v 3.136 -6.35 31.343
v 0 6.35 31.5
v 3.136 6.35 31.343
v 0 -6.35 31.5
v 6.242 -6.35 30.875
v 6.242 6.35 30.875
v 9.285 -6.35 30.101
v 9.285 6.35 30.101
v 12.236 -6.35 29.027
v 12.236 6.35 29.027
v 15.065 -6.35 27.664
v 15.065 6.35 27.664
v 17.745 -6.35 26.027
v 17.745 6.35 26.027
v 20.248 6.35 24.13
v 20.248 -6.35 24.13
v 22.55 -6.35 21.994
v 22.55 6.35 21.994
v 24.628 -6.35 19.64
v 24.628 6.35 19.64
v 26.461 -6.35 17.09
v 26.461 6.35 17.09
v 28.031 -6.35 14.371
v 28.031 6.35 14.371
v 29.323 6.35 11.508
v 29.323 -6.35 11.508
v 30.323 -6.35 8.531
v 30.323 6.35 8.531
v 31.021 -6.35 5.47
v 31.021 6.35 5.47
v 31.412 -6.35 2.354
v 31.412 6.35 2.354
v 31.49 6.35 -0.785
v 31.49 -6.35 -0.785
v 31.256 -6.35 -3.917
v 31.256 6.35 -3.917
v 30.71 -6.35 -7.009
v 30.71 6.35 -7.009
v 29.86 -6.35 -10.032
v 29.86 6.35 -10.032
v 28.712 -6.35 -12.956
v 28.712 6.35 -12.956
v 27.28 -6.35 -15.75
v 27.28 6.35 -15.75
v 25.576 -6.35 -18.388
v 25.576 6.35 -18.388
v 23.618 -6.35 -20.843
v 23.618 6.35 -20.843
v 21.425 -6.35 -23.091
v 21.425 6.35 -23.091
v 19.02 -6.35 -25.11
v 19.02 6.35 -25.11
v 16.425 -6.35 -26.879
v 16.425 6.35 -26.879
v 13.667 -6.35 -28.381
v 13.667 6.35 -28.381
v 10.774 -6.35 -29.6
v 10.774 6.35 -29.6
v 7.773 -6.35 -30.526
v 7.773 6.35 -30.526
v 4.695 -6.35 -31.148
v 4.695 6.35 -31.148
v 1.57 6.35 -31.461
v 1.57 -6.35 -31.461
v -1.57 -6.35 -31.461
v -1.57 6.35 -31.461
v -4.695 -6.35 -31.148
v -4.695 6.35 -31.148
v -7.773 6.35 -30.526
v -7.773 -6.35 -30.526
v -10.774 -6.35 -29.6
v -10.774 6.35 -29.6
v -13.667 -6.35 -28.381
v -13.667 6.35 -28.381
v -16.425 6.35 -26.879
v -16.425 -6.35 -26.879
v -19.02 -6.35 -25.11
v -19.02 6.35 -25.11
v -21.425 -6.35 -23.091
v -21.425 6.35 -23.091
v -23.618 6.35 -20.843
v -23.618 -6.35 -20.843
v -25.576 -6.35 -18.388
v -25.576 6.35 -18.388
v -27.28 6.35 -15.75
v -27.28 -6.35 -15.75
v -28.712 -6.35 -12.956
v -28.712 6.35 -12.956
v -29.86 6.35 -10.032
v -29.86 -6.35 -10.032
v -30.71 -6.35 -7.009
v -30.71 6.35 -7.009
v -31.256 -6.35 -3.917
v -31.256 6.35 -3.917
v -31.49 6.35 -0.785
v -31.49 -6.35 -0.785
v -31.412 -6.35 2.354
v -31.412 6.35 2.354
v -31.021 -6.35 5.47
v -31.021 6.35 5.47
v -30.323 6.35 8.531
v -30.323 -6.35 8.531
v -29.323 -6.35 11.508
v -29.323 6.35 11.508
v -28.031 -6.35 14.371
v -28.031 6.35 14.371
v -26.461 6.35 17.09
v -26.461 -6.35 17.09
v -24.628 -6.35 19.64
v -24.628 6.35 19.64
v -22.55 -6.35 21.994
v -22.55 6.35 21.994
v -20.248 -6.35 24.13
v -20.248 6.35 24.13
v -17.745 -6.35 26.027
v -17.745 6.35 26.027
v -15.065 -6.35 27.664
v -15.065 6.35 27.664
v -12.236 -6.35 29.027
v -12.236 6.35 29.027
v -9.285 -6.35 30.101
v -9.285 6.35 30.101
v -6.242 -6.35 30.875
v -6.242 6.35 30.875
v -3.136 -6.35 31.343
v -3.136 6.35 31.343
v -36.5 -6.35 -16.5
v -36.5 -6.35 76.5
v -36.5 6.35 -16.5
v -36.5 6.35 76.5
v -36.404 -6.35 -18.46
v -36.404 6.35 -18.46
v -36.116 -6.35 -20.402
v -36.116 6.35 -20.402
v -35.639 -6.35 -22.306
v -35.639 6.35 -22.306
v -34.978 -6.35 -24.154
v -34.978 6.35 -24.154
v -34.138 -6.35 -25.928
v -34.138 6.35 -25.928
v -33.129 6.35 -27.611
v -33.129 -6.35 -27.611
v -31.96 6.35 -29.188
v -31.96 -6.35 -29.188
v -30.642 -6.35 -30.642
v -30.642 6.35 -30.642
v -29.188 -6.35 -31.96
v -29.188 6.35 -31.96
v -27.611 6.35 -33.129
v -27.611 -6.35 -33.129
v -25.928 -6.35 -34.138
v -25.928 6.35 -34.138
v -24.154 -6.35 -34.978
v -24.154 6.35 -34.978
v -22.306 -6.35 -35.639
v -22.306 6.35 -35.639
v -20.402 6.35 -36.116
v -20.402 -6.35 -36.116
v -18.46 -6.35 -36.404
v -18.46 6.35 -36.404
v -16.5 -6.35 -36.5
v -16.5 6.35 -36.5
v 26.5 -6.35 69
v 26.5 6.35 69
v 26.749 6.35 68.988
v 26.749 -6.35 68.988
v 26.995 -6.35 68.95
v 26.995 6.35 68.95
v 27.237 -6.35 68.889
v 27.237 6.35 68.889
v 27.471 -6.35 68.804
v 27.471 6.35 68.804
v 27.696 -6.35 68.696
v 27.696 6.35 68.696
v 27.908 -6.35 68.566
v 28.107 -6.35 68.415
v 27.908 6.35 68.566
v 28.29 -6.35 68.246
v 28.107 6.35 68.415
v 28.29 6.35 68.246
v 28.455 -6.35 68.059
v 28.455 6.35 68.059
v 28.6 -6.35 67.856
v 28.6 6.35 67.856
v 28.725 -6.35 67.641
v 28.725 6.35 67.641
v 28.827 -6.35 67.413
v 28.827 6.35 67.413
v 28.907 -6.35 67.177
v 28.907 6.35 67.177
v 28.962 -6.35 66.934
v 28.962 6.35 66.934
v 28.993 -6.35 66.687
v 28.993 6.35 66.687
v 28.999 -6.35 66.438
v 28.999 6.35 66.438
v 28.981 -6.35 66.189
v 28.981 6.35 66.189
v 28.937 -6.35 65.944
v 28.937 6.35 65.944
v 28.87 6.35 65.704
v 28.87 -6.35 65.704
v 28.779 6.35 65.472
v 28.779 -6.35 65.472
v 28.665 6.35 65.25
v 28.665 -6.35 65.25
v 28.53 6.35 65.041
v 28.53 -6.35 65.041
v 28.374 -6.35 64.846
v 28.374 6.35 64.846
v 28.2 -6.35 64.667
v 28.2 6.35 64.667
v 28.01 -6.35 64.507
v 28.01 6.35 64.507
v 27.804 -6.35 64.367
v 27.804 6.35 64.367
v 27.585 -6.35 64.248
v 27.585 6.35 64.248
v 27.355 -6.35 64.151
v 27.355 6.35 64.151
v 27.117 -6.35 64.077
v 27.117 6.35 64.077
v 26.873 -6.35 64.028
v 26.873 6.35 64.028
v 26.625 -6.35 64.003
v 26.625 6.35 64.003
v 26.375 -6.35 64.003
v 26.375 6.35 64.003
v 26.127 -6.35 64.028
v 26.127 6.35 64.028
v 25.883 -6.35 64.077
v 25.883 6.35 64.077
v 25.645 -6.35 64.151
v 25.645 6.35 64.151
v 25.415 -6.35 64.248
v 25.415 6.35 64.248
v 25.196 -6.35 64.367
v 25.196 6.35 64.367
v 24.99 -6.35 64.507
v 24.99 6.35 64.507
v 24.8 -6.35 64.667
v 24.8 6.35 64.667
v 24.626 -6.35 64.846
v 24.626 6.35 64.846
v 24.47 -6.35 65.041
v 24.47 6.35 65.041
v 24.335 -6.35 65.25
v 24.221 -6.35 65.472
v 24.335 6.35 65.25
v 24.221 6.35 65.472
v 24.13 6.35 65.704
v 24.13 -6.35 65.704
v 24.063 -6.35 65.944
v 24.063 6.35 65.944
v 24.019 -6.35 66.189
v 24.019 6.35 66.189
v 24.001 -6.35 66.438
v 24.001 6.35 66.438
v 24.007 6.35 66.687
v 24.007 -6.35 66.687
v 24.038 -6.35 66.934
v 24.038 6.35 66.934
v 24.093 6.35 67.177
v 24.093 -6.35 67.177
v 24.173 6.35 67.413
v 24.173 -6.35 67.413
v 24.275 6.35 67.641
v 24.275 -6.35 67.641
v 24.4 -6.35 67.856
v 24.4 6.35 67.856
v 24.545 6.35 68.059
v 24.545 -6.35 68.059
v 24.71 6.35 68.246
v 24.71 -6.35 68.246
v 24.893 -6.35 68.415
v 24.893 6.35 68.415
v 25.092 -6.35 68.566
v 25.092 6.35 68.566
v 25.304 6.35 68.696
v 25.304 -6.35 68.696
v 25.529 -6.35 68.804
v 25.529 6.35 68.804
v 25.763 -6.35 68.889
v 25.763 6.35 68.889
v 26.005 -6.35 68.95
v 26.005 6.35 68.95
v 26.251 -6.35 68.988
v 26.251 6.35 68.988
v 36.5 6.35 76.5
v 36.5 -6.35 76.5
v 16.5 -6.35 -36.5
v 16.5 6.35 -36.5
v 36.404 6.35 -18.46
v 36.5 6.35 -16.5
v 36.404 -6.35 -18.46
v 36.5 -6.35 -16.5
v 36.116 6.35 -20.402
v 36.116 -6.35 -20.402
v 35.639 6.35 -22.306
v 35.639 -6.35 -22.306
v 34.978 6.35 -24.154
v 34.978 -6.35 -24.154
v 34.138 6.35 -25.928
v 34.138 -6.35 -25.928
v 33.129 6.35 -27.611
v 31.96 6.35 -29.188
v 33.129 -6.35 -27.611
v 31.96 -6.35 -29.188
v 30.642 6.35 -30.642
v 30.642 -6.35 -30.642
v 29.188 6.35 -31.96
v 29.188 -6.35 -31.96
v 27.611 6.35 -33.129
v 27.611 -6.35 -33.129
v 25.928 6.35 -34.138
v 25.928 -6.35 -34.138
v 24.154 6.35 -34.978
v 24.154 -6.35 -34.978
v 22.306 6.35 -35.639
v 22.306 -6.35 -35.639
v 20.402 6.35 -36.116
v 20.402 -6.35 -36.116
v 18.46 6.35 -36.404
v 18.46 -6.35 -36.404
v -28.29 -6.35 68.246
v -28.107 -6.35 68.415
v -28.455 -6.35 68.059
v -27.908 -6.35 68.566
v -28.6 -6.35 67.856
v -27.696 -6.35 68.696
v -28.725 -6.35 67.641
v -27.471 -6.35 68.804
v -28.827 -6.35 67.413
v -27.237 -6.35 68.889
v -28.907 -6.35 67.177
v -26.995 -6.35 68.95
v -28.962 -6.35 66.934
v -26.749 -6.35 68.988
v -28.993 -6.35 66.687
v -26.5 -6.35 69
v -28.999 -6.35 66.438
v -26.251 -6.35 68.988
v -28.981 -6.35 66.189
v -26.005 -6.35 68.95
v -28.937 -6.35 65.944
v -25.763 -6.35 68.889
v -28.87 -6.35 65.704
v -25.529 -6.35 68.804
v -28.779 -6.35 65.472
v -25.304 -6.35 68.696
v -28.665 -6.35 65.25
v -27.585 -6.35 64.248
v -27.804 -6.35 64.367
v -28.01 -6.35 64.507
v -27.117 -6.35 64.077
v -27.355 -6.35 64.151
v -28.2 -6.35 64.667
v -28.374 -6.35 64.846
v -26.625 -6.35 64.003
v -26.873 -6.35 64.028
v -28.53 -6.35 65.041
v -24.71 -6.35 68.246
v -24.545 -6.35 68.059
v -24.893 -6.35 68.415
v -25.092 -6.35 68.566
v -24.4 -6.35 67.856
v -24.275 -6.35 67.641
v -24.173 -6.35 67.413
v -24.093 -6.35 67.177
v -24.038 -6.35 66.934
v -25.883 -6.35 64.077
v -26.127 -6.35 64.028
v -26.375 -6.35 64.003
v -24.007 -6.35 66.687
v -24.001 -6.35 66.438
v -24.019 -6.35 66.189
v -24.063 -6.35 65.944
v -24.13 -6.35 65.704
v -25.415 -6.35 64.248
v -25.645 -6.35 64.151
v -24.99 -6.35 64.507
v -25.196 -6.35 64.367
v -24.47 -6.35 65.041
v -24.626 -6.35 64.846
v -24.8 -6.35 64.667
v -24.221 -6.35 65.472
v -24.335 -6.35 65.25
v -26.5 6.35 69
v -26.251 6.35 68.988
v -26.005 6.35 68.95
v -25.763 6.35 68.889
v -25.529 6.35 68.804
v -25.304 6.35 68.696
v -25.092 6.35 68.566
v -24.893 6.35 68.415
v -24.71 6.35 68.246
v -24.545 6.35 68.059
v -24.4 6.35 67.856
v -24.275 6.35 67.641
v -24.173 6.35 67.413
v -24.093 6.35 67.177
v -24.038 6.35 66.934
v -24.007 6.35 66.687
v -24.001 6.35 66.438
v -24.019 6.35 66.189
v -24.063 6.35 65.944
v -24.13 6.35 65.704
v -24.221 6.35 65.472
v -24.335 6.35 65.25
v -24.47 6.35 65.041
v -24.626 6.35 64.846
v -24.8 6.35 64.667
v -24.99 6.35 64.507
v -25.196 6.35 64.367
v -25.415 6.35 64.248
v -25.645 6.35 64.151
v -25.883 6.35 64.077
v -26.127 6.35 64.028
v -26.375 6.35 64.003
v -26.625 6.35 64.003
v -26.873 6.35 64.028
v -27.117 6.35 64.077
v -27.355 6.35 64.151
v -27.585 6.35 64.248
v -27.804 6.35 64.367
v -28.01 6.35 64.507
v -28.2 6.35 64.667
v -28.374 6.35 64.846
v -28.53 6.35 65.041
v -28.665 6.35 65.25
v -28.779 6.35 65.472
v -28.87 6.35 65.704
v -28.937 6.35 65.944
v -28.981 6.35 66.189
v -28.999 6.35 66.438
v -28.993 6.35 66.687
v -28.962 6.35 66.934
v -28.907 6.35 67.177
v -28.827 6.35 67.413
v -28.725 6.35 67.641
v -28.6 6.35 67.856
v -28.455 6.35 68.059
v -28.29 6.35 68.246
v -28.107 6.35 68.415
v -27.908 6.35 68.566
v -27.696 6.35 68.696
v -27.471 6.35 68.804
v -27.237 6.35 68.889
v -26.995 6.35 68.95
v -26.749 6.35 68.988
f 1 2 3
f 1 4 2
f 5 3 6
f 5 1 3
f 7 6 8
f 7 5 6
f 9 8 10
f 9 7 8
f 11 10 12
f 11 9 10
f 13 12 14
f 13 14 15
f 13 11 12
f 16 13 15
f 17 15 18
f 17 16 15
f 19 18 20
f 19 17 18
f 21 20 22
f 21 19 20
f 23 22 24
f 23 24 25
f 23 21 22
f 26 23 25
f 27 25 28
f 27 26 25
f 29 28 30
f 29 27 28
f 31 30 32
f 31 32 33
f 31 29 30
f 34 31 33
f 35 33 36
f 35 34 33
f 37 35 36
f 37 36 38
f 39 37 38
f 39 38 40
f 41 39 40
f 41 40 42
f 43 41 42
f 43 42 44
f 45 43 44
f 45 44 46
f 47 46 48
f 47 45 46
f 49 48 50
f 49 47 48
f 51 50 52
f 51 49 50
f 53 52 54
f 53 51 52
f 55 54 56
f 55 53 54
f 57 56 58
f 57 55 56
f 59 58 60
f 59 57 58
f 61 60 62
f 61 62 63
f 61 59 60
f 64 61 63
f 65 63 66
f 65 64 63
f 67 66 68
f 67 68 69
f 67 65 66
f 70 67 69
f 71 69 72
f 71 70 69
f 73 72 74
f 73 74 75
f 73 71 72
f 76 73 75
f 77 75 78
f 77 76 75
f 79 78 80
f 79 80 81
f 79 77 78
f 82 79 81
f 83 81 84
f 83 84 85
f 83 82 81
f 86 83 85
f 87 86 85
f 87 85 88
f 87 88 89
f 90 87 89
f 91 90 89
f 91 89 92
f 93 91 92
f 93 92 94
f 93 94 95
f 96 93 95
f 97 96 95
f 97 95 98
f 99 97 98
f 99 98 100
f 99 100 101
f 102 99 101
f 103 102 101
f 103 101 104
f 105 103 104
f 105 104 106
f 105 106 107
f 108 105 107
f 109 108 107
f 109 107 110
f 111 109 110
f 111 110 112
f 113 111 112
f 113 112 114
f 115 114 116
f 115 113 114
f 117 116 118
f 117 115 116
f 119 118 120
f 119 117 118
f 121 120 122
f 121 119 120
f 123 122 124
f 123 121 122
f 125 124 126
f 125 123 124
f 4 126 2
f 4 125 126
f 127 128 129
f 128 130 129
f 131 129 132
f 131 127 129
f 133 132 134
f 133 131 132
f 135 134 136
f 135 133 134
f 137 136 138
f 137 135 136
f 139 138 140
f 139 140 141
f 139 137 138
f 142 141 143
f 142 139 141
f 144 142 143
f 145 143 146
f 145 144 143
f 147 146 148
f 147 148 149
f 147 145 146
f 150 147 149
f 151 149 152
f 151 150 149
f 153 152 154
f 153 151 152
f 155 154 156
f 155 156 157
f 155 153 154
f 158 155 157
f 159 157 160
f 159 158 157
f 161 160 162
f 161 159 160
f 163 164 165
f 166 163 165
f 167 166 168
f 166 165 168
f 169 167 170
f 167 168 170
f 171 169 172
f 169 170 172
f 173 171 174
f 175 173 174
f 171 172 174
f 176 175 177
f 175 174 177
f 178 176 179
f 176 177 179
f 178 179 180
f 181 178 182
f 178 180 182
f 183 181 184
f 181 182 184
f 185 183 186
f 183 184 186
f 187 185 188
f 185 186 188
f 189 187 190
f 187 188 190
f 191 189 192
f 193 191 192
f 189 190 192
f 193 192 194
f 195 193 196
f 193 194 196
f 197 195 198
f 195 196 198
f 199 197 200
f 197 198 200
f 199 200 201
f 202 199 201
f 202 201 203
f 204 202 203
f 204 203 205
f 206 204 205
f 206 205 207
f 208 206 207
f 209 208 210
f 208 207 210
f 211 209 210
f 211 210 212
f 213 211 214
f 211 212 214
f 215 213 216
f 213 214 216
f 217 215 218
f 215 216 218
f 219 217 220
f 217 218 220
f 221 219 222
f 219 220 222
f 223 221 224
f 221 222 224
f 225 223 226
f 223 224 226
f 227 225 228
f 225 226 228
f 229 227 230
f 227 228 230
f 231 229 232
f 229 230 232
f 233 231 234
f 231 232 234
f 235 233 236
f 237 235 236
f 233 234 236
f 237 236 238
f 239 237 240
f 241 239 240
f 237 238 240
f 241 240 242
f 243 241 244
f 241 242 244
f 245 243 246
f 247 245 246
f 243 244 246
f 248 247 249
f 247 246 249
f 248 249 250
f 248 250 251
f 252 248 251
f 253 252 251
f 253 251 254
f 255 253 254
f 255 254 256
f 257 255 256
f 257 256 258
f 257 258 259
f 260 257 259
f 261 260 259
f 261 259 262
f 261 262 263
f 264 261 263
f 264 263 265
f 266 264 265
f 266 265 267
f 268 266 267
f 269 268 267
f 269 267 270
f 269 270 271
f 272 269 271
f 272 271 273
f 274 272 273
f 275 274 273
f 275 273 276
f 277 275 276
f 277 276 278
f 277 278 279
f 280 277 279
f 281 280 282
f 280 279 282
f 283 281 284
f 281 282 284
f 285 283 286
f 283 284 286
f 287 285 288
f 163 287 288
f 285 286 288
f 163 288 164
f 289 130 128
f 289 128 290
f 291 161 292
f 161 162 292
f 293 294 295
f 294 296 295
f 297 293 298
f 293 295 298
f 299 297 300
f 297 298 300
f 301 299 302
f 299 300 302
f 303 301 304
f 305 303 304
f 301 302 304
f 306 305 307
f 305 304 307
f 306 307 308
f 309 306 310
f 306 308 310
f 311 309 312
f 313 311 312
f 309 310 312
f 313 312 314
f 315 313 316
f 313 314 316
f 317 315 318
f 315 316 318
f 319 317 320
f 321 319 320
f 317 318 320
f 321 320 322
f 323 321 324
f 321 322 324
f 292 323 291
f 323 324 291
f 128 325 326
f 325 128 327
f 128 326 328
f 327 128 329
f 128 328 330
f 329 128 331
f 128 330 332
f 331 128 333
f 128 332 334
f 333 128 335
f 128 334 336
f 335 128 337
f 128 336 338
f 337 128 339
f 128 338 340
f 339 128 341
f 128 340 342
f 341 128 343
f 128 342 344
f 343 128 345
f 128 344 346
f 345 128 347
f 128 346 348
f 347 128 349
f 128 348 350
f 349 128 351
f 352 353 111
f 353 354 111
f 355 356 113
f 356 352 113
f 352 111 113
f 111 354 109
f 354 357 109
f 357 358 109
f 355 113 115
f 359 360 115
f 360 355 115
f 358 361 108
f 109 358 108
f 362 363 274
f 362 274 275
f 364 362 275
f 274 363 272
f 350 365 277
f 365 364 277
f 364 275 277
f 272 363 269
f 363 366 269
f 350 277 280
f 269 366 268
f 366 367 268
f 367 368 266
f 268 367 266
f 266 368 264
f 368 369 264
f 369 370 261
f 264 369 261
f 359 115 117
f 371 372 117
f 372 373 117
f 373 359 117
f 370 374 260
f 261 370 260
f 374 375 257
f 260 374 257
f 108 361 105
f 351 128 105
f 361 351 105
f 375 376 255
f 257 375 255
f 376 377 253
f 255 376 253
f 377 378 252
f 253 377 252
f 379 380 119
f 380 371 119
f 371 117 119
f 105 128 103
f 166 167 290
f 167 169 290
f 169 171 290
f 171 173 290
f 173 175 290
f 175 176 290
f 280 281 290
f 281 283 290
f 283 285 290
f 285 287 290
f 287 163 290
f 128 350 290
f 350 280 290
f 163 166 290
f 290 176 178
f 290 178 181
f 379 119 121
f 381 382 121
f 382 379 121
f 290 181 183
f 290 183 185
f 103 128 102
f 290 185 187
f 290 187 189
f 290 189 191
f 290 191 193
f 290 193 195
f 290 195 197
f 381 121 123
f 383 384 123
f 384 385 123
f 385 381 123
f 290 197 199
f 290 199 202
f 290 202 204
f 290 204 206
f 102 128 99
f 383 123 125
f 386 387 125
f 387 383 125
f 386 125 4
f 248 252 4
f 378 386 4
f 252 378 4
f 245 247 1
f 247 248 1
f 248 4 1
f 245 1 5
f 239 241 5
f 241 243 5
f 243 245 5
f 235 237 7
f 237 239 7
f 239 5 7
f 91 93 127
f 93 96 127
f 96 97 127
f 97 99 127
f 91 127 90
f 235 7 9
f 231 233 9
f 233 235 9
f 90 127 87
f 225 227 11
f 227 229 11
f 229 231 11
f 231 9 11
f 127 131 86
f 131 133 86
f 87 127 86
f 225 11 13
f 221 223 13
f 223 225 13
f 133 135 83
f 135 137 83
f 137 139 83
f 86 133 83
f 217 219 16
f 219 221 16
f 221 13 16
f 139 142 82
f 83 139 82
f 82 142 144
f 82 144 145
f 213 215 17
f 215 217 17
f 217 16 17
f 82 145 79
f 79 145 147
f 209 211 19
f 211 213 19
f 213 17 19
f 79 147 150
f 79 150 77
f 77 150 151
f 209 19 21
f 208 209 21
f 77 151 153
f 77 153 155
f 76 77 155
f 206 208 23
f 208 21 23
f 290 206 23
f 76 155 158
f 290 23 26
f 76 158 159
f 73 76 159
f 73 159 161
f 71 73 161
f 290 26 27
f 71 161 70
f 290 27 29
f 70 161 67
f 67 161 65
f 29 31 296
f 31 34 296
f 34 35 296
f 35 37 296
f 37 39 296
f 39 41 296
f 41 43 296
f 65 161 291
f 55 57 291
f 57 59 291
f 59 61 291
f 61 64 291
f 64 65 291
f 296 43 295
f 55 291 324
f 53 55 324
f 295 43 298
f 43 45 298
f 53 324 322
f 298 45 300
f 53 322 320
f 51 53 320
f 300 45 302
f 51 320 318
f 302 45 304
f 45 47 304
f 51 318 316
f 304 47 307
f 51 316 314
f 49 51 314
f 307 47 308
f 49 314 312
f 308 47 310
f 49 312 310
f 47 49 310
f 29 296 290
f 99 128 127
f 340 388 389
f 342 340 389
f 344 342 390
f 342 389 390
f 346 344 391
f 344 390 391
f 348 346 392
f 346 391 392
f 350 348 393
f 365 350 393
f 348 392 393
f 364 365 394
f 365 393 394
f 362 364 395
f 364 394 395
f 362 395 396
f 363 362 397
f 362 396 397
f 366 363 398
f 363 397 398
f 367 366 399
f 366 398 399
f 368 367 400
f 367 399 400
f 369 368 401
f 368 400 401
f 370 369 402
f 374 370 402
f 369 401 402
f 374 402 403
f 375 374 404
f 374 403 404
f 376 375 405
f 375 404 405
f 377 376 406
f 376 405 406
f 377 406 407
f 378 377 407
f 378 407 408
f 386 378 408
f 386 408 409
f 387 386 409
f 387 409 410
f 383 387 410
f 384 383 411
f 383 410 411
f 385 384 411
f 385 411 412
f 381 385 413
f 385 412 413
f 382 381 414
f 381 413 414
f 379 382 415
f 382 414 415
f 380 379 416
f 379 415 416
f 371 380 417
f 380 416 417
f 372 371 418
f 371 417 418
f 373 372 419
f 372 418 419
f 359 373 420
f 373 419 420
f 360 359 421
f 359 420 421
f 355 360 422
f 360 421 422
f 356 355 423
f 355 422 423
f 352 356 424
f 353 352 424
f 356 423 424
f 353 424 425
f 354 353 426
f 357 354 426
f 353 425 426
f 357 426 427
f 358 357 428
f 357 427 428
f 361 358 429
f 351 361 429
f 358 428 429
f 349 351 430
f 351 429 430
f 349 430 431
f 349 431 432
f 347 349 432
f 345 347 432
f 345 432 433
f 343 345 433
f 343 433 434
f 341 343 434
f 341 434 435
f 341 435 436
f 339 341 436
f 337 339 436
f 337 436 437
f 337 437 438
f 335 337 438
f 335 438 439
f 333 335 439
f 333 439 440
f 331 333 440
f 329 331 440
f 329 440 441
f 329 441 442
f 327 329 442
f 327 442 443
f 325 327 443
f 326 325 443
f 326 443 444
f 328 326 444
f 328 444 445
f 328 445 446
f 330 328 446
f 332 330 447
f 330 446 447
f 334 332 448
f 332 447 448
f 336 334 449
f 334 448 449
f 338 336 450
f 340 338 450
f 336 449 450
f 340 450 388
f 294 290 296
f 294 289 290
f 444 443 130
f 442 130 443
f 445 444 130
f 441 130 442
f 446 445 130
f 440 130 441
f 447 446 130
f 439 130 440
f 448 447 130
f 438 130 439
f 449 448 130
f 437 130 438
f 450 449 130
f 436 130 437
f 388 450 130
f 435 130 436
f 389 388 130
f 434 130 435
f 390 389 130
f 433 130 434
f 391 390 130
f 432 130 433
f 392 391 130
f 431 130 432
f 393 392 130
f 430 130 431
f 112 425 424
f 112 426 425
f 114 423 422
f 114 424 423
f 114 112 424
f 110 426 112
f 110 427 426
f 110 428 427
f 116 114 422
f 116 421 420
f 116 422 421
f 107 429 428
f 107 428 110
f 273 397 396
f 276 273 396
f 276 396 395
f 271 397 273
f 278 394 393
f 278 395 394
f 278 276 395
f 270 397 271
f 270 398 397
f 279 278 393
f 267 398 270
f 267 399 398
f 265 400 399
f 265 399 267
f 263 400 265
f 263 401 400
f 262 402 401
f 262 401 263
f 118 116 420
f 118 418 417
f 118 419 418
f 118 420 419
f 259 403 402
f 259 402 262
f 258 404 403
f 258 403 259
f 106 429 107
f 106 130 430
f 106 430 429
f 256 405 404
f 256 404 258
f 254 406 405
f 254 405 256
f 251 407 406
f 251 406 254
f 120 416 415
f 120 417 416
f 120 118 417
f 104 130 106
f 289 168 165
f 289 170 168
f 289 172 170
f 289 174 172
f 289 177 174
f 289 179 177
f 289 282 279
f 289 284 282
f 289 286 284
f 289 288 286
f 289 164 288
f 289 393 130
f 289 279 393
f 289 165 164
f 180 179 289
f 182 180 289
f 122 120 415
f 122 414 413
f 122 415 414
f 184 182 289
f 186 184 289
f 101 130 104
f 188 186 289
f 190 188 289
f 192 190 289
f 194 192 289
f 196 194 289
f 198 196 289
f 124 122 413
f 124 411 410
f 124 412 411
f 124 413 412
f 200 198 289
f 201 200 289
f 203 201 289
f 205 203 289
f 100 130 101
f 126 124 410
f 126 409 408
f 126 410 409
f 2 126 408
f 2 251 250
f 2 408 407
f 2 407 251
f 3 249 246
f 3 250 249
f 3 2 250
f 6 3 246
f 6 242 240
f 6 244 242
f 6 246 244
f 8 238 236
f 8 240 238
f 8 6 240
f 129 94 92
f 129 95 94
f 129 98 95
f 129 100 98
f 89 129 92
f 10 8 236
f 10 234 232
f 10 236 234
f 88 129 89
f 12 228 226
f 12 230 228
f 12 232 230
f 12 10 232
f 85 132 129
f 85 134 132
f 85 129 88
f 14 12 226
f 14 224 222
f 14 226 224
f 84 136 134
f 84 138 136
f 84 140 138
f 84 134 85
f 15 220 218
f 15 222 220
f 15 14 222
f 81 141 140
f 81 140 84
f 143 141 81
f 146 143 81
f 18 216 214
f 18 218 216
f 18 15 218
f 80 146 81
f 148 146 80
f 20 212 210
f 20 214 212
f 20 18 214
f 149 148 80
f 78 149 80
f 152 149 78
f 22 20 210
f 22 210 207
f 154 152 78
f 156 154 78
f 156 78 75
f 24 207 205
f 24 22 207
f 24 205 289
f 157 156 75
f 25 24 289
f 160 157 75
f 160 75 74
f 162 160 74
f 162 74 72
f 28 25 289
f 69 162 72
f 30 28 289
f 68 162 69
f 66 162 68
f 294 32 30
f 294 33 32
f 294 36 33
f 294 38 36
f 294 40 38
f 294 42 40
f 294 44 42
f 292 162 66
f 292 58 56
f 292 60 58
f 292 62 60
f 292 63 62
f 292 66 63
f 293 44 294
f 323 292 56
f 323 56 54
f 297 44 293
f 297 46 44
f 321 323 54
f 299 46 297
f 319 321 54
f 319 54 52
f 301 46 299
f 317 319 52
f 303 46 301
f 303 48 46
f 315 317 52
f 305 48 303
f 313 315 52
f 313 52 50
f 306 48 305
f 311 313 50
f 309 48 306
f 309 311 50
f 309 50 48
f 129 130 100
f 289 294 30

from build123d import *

# Parameters (mm, degrees)
SKETCH2_W              = 73
SKETCH2_H              = 73
SKETCH2_R              = 31.5
BOSS_EXTRUDE2_DEPTH    = 6.35
SKETCH3_W              = 73
SKETCH3_H              = 40
SKETCH3_R              = 2.5
BOTTOM_MOUNT_DEPTH     = 12.7
BOTTOM_MOUNT_FILLETS_R = 20


with BuildPart() as part:
    # Sketch2 → Boss-Extrude2 (new, symmetric)
    with BuildSketch(Plane(origin=(0, 0, 0), x_dir=(1, 0, 0), z_dir=(0, 1, 0))):
        Rectangle(SKETCH2_W, SKETCH2_H)
        with Locations(Location((0, 0, 0), (0, 0, 270))):
            Circle(SKETCH2_R, mode=Mode.SUBTRACT)
    extrude(amount=BOSS_EXTRUDE2_DEPTH, both=True)

    # Sketch3 → Bottom Mount (add, through all)
    with BuildSketch(Plane(origin=(0, 6.35, 0), x_dir=(1, 0, 0), z_dir=(0, 1, 0))):
        with Locations((0, -56.5)):
            Rectangle(SKETCH3_W, SKETCH3_H)
        with Locations(Location((-26.5, -66.5, 0), (0, 0, 270))):
            Circle(SKETCH3_R, mode=Mode.SUBTRACT)
        with Locations(Location((26.5, -66.5, 0), (0, 0, 270))):
            Circle(SKETCH3_R, mode=Mode.SUBTRACT)
    extrude(amount=-BOTTOM_MOUNT_DEPTH)

    # Bottom Mount Fillets
    bottom_mount_fillets_edges = [part.edges().sort_by_distance(p)[0] for p in [
        (-36.5, 0, -36.5),
        (36.5, 0, -36.5),
    ]]
    fillet(bottom_mount_fillets_edges, radius=BOTTOM_MOUNT_FILLETS_R)


solid = part.part
